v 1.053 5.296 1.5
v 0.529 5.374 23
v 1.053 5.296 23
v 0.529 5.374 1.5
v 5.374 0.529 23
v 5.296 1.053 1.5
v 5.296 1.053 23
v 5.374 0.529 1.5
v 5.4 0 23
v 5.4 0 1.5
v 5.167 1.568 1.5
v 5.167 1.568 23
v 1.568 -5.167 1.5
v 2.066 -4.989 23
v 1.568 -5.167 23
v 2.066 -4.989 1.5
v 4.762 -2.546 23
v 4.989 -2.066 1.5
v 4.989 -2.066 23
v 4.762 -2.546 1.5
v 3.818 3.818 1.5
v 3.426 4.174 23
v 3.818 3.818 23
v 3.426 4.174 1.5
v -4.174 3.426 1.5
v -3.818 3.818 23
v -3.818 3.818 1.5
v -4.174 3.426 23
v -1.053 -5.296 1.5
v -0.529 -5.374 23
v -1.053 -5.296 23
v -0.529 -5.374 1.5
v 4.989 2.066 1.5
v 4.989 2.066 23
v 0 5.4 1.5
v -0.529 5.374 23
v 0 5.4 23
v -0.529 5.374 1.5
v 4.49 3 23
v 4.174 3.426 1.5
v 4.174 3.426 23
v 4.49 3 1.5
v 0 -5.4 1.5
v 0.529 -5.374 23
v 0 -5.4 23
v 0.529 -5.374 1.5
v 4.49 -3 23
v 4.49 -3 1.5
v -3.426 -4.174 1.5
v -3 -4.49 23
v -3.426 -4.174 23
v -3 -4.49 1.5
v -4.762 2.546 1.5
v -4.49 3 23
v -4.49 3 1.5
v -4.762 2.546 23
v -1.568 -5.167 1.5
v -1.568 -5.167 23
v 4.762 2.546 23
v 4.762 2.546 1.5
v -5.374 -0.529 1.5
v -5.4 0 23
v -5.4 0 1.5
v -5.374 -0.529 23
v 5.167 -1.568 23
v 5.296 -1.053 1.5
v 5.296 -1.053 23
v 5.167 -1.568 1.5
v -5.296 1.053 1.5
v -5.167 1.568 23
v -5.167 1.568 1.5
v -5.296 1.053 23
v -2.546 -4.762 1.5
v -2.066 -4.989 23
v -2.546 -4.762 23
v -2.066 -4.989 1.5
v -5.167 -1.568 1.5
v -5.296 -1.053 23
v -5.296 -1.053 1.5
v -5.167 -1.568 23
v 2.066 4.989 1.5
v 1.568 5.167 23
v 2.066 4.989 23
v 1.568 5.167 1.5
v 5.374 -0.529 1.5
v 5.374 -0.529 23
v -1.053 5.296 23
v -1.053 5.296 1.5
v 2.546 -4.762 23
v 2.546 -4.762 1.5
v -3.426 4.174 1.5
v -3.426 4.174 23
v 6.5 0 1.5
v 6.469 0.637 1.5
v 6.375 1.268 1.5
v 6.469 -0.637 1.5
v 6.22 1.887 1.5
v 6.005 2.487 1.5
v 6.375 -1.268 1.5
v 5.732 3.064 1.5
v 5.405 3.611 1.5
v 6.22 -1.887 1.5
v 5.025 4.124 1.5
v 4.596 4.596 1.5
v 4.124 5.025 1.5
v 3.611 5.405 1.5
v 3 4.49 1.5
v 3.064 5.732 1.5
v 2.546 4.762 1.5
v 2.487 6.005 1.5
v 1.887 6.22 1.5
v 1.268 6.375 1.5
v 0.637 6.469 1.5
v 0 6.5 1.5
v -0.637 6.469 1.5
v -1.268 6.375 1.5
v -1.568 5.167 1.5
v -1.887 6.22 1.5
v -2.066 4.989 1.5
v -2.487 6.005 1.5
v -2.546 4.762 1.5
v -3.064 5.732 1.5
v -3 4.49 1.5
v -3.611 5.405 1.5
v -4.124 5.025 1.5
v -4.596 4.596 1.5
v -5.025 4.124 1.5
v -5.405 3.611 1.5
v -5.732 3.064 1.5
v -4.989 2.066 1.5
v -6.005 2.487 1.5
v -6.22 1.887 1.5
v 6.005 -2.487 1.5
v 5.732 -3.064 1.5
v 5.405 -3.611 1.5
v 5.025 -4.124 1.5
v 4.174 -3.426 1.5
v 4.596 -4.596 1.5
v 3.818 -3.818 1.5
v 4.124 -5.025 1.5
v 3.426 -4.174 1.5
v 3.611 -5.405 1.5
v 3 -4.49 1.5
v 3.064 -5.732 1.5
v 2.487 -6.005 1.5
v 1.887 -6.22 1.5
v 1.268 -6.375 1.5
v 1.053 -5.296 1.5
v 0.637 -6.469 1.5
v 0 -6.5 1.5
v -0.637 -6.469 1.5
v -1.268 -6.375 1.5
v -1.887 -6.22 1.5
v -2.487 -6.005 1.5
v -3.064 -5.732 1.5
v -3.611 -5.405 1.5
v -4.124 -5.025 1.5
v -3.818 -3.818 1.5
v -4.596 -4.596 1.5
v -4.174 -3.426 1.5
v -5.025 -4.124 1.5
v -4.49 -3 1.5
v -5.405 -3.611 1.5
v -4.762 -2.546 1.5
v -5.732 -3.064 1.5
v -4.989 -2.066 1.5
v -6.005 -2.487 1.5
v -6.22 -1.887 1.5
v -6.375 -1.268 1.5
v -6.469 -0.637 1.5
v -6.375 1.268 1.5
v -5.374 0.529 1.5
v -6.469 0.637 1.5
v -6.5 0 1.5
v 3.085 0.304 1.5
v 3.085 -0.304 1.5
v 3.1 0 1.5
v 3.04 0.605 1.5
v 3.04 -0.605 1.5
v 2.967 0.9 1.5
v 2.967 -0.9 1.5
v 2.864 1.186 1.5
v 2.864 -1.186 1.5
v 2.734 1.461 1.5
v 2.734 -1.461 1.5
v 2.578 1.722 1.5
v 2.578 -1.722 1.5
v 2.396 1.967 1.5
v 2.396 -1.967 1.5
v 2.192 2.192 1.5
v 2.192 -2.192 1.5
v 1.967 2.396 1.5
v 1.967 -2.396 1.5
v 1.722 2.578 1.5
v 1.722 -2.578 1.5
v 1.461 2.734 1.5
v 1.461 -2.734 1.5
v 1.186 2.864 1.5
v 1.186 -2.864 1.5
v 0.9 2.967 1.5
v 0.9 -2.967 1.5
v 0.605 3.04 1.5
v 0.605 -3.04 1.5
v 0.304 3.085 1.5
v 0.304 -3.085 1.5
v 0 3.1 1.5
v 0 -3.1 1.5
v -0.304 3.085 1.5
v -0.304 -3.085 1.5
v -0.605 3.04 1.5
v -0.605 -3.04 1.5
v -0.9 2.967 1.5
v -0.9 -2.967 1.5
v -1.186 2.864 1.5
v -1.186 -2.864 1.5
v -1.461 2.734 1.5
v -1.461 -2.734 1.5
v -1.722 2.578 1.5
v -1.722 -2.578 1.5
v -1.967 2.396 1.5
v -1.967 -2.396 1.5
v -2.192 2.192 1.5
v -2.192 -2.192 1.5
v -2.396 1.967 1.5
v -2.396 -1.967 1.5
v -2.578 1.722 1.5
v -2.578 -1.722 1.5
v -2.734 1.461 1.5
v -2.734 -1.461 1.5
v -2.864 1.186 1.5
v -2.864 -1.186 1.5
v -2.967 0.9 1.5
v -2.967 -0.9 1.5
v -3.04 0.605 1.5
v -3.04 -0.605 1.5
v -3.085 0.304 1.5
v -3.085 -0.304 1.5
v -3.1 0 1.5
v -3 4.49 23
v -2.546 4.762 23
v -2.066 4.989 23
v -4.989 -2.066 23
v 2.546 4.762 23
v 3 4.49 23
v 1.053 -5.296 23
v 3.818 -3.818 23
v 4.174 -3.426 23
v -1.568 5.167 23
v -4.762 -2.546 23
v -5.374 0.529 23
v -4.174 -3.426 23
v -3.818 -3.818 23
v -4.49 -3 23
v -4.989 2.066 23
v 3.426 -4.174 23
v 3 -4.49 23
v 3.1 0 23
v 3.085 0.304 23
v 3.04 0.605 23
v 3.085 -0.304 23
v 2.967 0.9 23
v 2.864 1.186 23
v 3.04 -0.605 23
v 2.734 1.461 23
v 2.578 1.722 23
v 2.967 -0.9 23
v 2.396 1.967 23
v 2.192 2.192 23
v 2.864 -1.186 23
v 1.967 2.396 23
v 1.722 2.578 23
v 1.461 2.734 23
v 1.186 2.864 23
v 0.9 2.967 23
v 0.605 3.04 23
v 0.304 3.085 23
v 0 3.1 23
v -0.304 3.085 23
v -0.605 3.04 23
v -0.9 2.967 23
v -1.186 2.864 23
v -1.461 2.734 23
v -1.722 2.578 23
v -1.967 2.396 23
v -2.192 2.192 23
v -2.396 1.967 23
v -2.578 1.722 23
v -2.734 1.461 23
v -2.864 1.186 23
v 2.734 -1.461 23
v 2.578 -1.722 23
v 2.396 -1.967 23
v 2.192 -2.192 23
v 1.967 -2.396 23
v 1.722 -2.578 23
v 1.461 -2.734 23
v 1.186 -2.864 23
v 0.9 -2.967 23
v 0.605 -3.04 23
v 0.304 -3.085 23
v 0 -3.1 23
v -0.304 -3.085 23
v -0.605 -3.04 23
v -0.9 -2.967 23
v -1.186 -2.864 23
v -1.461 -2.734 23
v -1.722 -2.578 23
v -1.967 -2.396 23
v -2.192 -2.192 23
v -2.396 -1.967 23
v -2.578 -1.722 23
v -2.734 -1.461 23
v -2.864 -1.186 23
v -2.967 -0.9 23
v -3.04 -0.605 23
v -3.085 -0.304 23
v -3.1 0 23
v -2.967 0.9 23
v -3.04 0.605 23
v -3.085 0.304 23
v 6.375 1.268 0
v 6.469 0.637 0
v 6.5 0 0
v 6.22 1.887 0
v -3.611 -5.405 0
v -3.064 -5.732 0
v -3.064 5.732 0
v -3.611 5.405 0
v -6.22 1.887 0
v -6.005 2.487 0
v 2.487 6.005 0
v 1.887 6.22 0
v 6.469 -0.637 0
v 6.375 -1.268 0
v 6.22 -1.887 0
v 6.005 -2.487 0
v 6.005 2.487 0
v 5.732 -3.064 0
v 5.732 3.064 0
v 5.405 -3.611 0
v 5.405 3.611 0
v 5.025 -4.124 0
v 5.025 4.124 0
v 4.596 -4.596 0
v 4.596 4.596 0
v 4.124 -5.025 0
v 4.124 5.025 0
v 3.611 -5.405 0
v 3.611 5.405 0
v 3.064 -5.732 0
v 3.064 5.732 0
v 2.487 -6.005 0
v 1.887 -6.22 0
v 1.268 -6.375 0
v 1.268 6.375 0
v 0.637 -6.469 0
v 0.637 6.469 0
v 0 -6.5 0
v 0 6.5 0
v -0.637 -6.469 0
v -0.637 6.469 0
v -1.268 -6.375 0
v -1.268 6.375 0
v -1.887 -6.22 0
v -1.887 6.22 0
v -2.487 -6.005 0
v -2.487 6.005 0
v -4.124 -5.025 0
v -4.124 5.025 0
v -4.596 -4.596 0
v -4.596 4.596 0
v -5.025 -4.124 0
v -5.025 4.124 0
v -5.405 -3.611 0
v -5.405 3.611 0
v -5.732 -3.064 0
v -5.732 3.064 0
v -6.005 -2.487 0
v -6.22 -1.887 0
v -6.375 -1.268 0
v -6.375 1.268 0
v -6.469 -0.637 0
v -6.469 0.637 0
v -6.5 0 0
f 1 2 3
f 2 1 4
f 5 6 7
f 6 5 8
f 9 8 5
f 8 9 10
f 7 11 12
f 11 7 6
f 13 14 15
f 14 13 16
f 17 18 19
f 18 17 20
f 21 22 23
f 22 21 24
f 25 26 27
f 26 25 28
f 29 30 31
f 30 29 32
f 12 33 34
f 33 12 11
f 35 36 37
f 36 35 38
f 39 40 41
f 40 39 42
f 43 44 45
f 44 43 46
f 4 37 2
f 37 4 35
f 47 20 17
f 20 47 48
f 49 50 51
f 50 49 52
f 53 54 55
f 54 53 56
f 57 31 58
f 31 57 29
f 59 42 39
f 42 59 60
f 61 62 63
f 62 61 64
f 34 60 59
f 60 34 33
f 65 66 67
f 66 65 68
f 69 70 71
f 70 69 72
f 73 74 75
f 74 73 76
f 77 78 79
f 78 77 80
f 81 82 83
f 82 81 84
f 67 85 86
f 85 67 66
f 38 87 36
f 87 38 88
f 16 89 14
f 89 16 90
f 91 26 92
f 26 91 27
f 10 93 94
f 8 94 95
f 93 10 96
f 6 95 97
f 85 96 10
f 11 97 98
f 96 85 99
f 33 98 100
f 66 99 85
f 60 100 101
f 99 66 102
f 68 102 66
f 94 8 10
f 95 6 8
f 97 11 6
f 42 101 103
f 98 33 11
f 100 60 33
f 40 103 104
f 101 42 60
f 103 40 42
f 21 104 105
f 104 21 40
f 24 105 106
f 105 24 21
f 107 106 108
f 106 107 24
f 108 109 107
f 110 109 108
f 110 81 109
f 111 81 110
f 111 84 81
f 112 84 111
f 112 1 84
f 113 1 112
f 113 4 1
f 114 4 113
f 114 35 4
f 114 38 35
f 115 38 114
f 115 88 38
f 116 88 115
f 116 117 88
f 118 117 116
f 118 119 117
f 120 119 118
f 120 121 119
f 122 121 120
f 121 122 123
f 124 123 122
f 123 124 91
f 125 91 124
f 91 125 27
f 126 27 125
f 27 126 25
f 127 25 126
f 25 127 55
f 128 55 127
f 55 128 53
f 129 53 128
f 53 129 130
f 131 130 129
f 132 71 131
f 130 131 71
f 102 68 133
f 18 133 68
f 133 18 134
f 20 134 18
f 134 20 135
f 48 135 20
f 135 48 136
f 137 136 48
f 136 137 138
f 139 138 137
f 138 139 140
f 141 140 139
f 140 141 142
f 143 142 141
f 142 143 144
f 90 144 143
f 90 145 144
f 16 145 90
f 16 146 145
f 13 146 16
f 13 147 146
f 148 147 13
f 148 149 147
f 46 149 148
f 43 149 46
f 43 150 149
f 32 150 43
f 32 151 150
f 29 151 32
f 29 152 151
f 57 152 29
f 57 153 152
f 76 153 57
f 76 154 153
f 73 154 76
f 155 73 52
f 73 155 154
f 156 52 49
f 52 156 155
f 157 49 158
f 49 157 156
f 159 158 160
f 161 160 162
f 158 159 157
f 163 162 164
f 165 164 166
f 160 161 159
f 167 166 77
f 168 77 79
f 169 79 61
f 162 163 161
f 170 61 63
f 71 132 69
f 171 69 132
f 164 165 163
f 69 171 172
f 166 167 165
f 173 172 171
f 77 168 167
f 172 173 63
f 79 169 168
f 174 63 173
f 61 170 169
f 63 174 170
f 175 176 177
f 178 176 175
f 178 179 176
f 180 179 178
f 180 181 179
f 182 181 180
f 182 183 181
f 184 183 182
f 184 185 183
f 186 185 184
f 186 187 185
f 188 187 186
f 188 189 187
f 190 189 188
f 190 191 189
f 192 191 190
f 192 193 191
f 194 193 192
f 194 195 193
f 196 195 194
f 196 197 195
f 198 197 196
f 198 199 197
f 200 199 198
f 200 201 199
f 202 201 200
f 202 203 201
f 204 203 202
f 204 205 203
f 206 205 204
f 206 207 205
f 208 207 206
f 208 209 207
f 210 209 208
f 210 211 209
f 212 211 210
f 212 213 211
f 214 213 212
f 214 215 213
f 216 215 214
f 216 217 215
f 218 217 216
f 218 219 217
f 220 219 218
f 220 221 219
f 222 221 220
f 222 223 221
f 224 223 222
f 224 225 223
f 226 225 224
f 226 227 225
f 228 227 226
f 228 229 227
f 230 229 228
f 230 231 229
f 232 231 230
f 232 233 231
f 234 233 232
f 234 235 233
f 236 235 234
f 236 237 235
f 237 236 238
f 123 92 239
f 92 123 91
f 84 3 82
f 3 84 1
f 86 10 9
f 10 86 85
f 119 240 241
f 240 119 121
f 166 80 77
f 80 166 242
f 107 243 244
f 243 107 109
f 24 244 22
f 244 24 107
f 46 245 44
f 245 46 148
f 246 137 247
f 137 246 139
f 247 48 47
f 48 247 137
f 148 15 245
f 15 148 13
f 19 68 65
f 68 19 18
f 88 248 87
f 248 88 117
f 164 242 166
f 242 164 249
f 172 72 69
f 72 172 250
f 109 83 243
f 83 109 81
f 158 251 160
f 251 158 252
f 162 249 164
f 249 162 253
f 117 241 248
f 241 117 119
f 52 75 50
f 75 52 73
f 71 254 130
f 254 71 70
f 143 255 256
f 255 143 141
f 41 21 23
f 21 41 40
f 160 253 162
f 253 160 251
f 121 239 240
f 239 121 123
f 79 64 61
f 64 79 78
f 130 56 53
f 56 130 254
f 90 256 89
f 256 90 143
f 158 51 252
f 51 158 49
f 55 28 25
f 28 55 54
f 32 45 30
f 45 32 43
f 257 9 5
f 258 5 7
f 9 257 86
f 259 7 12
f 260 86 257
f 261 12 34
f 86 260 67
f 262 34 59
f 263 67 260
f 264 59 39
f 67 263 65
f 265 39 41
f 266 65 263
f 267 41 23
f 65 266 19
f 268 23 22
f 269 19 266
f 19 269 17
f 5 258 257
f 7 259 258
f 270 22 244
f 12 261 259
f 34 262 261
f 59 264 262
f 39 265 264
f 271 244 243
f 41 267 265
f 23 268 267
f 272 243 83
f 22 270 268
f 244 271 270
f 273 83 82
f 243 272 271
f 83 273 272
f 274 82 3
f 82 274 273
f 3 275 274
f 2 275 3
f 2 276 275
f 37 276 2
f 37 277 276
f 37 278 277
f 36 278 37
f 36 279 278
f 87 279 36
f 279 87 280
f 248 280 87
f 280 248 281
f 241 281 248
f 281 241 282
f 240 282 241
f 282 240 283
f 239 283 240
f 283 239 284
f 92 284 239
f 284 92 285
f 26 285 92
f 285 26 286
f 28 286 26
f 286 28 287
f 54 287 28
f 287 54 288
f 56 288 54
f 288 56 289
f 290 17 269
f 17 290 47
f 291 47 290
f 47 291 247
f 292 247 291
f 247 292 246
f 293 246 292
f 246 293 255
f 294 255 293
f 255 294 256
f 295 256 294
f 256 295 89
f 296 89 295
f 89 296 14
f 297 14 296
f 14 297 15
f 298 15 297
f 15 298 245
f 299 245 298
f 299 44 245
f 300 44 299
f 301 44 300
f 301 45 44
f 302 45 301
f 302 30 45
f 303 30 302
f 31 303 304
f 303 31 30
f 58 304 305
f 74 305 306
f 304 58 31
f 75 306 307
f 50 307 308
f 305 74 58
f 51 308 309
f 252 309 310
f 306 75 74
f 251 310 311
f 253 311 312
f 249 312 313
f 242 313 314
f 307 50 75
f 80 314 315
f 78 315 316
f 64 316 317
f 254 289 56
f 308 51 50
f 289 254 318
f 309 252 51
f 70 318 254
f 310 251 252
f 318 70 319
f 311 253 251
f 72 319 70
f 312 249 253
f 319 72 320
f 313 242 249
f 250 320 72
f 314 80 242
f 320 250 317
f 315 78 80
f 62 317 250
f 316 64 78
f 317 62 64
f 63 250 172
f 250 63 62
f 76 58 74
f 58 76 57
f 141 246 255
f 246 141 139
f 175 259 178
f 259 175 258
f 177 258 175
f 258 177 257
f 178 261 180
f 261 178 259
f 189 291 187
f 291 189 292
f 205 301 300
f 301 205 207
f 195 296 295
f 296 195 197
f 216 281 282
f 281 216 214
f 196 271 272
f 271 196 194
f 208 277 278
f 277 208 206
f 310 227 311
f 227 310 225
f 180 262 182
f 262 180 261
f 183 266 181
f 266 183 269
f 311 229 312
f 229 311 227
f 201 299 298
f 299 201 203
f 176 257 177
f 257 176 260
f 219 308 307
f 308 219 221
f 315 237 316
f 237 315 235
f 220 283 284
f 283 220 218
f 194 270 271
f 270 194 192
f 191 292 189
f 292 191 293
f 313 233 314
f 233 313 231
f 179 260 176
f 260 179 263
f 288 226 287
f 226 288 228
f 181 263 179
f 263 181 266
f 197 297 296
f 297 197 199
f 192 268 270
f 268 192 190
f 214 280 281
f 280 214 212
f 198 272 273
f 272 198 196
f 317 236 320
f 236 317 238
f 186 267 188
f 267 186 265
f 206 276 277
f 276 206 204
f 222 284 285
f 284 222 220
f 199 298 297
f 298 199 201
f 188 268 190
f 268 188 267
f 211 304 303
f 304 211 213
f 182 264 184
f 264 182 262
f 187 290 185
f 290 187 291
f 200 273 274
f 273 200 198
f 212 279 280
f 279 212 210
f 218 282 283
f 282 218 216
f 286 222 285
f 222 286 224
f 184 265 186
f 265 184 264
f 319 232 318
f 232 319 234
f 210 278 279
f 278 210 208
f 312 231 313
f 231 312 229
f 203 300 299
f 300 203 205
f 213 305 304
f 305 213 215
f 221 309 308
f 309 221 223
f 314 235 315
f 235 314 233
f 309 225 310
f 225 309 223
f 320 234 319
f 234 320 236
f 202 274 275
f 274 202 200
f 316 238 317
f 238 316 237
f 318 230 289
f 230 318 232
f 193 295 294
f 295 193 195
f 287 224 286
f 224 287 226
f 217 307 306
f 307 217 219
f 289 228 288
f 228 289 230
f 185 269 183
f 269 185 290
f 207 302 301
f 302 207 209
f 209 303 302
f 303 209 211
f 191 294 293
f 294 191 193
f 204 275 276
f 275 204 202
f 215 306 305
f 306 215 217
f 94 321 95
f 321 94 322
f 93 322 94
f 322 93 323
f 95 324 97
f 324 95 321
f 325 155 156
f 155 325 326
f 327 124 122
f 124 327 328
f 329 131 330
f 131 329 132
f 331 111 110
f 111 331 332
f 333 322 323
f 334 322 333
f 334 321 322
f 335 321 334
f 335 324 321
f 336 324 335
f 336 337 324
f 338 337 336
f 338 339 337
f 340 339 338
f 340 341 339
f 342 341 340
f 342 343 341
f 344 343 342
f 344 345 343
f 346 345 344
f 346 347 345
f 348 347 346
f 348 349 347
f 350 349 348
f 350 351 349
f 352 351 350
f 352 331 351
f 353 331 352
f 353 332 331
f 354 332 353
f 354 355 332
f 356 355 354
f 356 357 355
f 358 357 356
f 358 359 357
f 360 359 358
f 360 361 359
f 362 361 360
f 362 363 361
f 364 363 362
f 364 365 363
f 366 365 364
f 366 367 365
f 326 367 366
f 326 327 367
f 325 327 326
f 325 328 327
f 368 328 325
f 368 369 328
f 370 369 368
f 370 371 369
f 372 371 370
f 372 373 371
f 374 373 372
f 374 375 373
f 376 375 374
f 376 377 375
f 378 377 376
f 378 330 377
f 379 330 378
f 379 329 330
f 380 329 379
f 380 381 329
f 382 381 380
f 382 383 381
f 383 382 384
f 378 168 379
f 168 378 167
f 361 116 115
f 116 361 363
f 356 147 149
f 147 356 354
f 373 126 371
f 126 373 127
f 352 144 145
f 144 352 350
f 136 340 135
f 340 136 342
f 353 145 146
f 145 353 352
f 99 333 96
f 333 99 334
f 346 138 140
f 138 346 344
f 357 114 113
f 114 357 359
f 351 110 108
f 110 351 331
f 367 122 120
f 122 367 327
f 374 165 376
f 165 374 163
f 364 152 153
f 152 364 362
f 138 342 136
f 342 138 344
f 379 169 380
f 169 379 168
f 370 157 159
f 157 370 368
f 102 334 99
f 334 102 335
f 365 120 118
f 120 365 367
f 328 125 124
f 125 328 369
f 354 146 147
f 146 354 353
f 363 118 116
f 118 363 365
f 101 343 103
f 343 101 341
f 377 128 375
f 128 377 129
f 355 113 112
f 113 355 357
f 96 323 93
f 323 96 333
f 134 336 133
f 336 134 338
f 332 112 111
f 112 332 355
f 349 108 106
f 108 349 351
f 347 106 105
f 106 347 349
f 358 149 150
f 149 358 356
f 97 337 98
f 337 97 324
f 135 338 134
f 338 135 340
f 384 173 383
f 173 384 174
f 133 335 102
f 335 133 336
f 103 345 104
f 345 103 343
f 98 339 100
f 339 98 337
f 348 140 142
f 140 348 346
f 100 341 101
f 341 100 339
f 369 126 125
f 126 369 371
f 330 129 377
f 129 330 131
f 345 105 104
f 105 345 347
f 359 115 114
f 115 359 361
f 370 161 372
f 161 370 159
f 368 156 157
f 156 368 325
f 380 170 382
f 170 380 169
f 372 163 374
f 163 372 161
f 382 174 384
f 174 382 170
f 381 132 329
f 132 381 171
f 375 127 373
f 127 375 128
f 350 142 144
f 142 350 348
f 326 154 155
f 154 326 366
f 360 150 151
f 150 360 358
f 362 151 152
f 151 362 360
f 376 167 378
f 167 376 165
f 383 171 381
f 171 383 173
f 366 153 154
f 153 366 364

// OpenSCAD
// Dimensions for the PCR tube adapter sleeve (Corrected version)

// Collar dimensions
collar_diameter = 13;  // Diameter of the collar in mm
collar_thickness = 1.5; // Thickness of the collar in mm

// Sleeve body dimensions
sleeve_outer_diameter = 10.8; // Outer diameter of the sleeve body in mm
sleeve_height = 21.5;         // Height of the sleeve body (rises from z=1.5 to z=21.5)

// Bore dimensions
bore_diameter = 6.2;       // Diameter of the central bore in mm

// Positioning and tolerances
// Collar rests on the bed at z=0, extends up to z = collar_thickness (1.5)
collar_z_top = collar_thickness; 
sleeve_bottom_z = collar_thickness; // Sleeve starts where the collar ends (at z=1.5)
sleeve_top_z = sleeve_bottom_z + sleeve_height; // Total height calculation: 1.5 + 21.5 = 23.0

// --- 1. Collar ---
module adapter_collar() {
    // Cylinder with diameter 13 mm and height 1.5 mm
    cylinder(h = collar_thickness, r = collar_diameter / 2, $fn = 64);
}

// --- 2. Sleeve Body ---
module adapter_sleeve() {
    difference() {
        // Outer shape of the sleeve body (Cylinder with OD 10.8 mm)
        cylinder(h = sleeve_height, r = sleeve_outer_diameter / 2, $fn = 64);

        // Inner bore (cutout). We translate slightly below to ensure a clean cut through the entire height.
        translate([0, 0, -0.1]) { // Small offset for guaranteed cut clearance
            cylinder(h = sleeve_height + 0.2, r = bore_diameter / 2, $fn = 64);
        }
    }
}

// --- Assembly ---

// Place the collar at the bottom (z=0 to z=1.5)
translate([0, 0, 0]) {
    adapter_collar();
}

// Place the sleeve body starting exactly where the collar ends (z=1.5)
translate([0, 0, sleeve_bottom_z]) {
    adapter_sleeve();
}
